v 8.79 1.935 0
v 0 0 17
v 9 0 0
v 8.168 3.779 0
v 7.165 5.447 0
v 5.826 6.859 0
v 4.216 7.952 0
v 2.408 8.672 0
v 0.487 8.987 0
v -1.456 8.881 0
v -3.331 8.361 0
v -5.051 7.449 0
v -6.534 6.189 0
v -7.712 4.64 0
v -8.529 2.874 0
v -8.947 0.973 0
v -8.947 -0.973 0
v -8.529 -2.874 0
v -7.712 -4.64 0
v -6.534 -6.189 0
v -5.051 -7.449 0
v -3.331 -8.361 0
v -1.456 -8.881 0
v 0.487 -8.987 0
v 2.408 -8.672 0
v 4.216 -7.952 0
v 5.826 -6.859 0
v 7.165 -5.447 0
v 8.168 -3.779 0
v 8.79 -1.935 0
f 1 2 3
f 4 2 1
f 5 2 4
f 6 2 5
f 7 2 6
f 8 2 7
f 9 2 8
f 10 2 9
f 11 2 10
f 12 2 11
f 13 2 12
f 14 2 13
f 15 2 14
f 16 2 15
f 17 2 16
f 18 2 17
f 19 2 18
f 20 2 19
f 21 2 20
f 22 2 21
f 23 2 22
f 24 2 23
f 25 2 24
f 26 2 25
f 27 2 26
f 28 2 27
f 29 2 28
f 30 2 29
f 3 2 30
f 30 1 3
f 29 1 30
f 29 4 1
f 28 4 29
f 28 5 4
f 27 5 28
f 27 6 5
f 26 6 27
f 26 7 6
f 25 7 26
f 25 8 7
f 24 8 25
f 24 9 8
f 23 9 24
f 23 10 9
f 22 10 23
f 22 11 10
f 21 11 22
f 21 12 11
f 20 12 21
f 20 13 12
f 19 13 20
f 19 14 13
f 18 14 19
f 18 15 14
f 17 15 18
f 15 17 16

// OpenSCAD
// Generated by SolidPython 1.0.1 on 2020-07-29 00:46:43


cylinder(h = 17, r1 = 9, r2 = 0);
/***********************************************
*********      SolidPython code:      **********
************************************************
 
# import packages: SolidPython
from solid import *
from solid.utils import *
from itertools import chain, combinations, permutations


class Resize:

    def __init__(self, scad_file):
        self.scad_file = scad_file
        #self.scad_file = import_scad(scad_file)
        # cone/cylinder param:
        self.r1 = 0
        self.r2 = 0
        self.h = 0
        # rectangular prism param:
        self.w = 0
        self.l = 0
        # ellipse param:
        self.r = 0

    # import OpenScad code (file name corresponds to shape)


    # classify shape + parameters
    def assign(self, param1, param2, param3):
        if self.scad_file == 'cone.scad':
            self.r1 = param1
            self.r2 = param2
            self.h = param3
        elif self.scad_file == 'cylinder.scad':
            self.r1 = param1
            self.r2 = param2
            self.h = param3
        elif self.scad_file == 'rectangularPrism.scad':
            self.h = param1
            self.l = param2
            self.w = param3
        else:
            self.r = param1
            self.h = param2

    # resize parameters
    def iterate(self):
        x = range(3, 20, 2)
        i = 1
        if self.scad_file == 'cone.scad':
            tempList = list(permutations(x, 2))
            for temp in tempList:
                param1 = temp[0]
                param2 = temp[1]
                filepath = 'produced_scad_files/' + 'cone' + str(param1) + '_' + str(param2) + '_' + '.scad'
                scad_render_to_file(cylinder(h=param1, r1=param2, r2=0), filepath)

        elif self.scad_file == 'cylinder.scad':
            tempList = list(permutations(x, 3))
            for temp in tempList:
                param1 = temp[0]
                param2 = temp[1]
                filepath = 'produced_scad_files/' + 'cylinder' + str(param1) + '_' + str(param2) + '_' + '.scad'
                scad_render_to_file(cylinder(h=param1, r1=param2, r2=param2), filepath)

        elif self.scad_file == 'rectangularPrism.scad':
            tempList = list(permutations(x, 3))
            for temp in tempList:
                param1 = temp[0]
                param2 = temp[1]
                param3 = temp[2]
                filepath = 'produced_scad_files/' + 'rectangularPrism' + str(param1) + '_' + str(param2) + '_' + str(
                    param3) + '.scad'
                scad_render_to_file(cube(size=(param1, param2, param3)), filepath)

        elif self.scad_file == 'ellipse.scad':
            tempList = list(permutations(x, 4))
            for temp in tempList:
                param1 = temp[0]
                param2 = temp[1]
                param3 = temp[2]
                param4 = temp[3]
                filepath = 'produced_scad_files/' + 'ellipse' + str(param1) + '_' + str(param2) + '_' + str(param3) + '_' + str(param4) + '.scad'
                scad_render_to_file(scale([param1, param2, param3])(sphere(r=param4)), filepath)

    def render_to_scadfile(self):
        scad_render_to_file(scad, 'example.scad') 
 
************************************************/
